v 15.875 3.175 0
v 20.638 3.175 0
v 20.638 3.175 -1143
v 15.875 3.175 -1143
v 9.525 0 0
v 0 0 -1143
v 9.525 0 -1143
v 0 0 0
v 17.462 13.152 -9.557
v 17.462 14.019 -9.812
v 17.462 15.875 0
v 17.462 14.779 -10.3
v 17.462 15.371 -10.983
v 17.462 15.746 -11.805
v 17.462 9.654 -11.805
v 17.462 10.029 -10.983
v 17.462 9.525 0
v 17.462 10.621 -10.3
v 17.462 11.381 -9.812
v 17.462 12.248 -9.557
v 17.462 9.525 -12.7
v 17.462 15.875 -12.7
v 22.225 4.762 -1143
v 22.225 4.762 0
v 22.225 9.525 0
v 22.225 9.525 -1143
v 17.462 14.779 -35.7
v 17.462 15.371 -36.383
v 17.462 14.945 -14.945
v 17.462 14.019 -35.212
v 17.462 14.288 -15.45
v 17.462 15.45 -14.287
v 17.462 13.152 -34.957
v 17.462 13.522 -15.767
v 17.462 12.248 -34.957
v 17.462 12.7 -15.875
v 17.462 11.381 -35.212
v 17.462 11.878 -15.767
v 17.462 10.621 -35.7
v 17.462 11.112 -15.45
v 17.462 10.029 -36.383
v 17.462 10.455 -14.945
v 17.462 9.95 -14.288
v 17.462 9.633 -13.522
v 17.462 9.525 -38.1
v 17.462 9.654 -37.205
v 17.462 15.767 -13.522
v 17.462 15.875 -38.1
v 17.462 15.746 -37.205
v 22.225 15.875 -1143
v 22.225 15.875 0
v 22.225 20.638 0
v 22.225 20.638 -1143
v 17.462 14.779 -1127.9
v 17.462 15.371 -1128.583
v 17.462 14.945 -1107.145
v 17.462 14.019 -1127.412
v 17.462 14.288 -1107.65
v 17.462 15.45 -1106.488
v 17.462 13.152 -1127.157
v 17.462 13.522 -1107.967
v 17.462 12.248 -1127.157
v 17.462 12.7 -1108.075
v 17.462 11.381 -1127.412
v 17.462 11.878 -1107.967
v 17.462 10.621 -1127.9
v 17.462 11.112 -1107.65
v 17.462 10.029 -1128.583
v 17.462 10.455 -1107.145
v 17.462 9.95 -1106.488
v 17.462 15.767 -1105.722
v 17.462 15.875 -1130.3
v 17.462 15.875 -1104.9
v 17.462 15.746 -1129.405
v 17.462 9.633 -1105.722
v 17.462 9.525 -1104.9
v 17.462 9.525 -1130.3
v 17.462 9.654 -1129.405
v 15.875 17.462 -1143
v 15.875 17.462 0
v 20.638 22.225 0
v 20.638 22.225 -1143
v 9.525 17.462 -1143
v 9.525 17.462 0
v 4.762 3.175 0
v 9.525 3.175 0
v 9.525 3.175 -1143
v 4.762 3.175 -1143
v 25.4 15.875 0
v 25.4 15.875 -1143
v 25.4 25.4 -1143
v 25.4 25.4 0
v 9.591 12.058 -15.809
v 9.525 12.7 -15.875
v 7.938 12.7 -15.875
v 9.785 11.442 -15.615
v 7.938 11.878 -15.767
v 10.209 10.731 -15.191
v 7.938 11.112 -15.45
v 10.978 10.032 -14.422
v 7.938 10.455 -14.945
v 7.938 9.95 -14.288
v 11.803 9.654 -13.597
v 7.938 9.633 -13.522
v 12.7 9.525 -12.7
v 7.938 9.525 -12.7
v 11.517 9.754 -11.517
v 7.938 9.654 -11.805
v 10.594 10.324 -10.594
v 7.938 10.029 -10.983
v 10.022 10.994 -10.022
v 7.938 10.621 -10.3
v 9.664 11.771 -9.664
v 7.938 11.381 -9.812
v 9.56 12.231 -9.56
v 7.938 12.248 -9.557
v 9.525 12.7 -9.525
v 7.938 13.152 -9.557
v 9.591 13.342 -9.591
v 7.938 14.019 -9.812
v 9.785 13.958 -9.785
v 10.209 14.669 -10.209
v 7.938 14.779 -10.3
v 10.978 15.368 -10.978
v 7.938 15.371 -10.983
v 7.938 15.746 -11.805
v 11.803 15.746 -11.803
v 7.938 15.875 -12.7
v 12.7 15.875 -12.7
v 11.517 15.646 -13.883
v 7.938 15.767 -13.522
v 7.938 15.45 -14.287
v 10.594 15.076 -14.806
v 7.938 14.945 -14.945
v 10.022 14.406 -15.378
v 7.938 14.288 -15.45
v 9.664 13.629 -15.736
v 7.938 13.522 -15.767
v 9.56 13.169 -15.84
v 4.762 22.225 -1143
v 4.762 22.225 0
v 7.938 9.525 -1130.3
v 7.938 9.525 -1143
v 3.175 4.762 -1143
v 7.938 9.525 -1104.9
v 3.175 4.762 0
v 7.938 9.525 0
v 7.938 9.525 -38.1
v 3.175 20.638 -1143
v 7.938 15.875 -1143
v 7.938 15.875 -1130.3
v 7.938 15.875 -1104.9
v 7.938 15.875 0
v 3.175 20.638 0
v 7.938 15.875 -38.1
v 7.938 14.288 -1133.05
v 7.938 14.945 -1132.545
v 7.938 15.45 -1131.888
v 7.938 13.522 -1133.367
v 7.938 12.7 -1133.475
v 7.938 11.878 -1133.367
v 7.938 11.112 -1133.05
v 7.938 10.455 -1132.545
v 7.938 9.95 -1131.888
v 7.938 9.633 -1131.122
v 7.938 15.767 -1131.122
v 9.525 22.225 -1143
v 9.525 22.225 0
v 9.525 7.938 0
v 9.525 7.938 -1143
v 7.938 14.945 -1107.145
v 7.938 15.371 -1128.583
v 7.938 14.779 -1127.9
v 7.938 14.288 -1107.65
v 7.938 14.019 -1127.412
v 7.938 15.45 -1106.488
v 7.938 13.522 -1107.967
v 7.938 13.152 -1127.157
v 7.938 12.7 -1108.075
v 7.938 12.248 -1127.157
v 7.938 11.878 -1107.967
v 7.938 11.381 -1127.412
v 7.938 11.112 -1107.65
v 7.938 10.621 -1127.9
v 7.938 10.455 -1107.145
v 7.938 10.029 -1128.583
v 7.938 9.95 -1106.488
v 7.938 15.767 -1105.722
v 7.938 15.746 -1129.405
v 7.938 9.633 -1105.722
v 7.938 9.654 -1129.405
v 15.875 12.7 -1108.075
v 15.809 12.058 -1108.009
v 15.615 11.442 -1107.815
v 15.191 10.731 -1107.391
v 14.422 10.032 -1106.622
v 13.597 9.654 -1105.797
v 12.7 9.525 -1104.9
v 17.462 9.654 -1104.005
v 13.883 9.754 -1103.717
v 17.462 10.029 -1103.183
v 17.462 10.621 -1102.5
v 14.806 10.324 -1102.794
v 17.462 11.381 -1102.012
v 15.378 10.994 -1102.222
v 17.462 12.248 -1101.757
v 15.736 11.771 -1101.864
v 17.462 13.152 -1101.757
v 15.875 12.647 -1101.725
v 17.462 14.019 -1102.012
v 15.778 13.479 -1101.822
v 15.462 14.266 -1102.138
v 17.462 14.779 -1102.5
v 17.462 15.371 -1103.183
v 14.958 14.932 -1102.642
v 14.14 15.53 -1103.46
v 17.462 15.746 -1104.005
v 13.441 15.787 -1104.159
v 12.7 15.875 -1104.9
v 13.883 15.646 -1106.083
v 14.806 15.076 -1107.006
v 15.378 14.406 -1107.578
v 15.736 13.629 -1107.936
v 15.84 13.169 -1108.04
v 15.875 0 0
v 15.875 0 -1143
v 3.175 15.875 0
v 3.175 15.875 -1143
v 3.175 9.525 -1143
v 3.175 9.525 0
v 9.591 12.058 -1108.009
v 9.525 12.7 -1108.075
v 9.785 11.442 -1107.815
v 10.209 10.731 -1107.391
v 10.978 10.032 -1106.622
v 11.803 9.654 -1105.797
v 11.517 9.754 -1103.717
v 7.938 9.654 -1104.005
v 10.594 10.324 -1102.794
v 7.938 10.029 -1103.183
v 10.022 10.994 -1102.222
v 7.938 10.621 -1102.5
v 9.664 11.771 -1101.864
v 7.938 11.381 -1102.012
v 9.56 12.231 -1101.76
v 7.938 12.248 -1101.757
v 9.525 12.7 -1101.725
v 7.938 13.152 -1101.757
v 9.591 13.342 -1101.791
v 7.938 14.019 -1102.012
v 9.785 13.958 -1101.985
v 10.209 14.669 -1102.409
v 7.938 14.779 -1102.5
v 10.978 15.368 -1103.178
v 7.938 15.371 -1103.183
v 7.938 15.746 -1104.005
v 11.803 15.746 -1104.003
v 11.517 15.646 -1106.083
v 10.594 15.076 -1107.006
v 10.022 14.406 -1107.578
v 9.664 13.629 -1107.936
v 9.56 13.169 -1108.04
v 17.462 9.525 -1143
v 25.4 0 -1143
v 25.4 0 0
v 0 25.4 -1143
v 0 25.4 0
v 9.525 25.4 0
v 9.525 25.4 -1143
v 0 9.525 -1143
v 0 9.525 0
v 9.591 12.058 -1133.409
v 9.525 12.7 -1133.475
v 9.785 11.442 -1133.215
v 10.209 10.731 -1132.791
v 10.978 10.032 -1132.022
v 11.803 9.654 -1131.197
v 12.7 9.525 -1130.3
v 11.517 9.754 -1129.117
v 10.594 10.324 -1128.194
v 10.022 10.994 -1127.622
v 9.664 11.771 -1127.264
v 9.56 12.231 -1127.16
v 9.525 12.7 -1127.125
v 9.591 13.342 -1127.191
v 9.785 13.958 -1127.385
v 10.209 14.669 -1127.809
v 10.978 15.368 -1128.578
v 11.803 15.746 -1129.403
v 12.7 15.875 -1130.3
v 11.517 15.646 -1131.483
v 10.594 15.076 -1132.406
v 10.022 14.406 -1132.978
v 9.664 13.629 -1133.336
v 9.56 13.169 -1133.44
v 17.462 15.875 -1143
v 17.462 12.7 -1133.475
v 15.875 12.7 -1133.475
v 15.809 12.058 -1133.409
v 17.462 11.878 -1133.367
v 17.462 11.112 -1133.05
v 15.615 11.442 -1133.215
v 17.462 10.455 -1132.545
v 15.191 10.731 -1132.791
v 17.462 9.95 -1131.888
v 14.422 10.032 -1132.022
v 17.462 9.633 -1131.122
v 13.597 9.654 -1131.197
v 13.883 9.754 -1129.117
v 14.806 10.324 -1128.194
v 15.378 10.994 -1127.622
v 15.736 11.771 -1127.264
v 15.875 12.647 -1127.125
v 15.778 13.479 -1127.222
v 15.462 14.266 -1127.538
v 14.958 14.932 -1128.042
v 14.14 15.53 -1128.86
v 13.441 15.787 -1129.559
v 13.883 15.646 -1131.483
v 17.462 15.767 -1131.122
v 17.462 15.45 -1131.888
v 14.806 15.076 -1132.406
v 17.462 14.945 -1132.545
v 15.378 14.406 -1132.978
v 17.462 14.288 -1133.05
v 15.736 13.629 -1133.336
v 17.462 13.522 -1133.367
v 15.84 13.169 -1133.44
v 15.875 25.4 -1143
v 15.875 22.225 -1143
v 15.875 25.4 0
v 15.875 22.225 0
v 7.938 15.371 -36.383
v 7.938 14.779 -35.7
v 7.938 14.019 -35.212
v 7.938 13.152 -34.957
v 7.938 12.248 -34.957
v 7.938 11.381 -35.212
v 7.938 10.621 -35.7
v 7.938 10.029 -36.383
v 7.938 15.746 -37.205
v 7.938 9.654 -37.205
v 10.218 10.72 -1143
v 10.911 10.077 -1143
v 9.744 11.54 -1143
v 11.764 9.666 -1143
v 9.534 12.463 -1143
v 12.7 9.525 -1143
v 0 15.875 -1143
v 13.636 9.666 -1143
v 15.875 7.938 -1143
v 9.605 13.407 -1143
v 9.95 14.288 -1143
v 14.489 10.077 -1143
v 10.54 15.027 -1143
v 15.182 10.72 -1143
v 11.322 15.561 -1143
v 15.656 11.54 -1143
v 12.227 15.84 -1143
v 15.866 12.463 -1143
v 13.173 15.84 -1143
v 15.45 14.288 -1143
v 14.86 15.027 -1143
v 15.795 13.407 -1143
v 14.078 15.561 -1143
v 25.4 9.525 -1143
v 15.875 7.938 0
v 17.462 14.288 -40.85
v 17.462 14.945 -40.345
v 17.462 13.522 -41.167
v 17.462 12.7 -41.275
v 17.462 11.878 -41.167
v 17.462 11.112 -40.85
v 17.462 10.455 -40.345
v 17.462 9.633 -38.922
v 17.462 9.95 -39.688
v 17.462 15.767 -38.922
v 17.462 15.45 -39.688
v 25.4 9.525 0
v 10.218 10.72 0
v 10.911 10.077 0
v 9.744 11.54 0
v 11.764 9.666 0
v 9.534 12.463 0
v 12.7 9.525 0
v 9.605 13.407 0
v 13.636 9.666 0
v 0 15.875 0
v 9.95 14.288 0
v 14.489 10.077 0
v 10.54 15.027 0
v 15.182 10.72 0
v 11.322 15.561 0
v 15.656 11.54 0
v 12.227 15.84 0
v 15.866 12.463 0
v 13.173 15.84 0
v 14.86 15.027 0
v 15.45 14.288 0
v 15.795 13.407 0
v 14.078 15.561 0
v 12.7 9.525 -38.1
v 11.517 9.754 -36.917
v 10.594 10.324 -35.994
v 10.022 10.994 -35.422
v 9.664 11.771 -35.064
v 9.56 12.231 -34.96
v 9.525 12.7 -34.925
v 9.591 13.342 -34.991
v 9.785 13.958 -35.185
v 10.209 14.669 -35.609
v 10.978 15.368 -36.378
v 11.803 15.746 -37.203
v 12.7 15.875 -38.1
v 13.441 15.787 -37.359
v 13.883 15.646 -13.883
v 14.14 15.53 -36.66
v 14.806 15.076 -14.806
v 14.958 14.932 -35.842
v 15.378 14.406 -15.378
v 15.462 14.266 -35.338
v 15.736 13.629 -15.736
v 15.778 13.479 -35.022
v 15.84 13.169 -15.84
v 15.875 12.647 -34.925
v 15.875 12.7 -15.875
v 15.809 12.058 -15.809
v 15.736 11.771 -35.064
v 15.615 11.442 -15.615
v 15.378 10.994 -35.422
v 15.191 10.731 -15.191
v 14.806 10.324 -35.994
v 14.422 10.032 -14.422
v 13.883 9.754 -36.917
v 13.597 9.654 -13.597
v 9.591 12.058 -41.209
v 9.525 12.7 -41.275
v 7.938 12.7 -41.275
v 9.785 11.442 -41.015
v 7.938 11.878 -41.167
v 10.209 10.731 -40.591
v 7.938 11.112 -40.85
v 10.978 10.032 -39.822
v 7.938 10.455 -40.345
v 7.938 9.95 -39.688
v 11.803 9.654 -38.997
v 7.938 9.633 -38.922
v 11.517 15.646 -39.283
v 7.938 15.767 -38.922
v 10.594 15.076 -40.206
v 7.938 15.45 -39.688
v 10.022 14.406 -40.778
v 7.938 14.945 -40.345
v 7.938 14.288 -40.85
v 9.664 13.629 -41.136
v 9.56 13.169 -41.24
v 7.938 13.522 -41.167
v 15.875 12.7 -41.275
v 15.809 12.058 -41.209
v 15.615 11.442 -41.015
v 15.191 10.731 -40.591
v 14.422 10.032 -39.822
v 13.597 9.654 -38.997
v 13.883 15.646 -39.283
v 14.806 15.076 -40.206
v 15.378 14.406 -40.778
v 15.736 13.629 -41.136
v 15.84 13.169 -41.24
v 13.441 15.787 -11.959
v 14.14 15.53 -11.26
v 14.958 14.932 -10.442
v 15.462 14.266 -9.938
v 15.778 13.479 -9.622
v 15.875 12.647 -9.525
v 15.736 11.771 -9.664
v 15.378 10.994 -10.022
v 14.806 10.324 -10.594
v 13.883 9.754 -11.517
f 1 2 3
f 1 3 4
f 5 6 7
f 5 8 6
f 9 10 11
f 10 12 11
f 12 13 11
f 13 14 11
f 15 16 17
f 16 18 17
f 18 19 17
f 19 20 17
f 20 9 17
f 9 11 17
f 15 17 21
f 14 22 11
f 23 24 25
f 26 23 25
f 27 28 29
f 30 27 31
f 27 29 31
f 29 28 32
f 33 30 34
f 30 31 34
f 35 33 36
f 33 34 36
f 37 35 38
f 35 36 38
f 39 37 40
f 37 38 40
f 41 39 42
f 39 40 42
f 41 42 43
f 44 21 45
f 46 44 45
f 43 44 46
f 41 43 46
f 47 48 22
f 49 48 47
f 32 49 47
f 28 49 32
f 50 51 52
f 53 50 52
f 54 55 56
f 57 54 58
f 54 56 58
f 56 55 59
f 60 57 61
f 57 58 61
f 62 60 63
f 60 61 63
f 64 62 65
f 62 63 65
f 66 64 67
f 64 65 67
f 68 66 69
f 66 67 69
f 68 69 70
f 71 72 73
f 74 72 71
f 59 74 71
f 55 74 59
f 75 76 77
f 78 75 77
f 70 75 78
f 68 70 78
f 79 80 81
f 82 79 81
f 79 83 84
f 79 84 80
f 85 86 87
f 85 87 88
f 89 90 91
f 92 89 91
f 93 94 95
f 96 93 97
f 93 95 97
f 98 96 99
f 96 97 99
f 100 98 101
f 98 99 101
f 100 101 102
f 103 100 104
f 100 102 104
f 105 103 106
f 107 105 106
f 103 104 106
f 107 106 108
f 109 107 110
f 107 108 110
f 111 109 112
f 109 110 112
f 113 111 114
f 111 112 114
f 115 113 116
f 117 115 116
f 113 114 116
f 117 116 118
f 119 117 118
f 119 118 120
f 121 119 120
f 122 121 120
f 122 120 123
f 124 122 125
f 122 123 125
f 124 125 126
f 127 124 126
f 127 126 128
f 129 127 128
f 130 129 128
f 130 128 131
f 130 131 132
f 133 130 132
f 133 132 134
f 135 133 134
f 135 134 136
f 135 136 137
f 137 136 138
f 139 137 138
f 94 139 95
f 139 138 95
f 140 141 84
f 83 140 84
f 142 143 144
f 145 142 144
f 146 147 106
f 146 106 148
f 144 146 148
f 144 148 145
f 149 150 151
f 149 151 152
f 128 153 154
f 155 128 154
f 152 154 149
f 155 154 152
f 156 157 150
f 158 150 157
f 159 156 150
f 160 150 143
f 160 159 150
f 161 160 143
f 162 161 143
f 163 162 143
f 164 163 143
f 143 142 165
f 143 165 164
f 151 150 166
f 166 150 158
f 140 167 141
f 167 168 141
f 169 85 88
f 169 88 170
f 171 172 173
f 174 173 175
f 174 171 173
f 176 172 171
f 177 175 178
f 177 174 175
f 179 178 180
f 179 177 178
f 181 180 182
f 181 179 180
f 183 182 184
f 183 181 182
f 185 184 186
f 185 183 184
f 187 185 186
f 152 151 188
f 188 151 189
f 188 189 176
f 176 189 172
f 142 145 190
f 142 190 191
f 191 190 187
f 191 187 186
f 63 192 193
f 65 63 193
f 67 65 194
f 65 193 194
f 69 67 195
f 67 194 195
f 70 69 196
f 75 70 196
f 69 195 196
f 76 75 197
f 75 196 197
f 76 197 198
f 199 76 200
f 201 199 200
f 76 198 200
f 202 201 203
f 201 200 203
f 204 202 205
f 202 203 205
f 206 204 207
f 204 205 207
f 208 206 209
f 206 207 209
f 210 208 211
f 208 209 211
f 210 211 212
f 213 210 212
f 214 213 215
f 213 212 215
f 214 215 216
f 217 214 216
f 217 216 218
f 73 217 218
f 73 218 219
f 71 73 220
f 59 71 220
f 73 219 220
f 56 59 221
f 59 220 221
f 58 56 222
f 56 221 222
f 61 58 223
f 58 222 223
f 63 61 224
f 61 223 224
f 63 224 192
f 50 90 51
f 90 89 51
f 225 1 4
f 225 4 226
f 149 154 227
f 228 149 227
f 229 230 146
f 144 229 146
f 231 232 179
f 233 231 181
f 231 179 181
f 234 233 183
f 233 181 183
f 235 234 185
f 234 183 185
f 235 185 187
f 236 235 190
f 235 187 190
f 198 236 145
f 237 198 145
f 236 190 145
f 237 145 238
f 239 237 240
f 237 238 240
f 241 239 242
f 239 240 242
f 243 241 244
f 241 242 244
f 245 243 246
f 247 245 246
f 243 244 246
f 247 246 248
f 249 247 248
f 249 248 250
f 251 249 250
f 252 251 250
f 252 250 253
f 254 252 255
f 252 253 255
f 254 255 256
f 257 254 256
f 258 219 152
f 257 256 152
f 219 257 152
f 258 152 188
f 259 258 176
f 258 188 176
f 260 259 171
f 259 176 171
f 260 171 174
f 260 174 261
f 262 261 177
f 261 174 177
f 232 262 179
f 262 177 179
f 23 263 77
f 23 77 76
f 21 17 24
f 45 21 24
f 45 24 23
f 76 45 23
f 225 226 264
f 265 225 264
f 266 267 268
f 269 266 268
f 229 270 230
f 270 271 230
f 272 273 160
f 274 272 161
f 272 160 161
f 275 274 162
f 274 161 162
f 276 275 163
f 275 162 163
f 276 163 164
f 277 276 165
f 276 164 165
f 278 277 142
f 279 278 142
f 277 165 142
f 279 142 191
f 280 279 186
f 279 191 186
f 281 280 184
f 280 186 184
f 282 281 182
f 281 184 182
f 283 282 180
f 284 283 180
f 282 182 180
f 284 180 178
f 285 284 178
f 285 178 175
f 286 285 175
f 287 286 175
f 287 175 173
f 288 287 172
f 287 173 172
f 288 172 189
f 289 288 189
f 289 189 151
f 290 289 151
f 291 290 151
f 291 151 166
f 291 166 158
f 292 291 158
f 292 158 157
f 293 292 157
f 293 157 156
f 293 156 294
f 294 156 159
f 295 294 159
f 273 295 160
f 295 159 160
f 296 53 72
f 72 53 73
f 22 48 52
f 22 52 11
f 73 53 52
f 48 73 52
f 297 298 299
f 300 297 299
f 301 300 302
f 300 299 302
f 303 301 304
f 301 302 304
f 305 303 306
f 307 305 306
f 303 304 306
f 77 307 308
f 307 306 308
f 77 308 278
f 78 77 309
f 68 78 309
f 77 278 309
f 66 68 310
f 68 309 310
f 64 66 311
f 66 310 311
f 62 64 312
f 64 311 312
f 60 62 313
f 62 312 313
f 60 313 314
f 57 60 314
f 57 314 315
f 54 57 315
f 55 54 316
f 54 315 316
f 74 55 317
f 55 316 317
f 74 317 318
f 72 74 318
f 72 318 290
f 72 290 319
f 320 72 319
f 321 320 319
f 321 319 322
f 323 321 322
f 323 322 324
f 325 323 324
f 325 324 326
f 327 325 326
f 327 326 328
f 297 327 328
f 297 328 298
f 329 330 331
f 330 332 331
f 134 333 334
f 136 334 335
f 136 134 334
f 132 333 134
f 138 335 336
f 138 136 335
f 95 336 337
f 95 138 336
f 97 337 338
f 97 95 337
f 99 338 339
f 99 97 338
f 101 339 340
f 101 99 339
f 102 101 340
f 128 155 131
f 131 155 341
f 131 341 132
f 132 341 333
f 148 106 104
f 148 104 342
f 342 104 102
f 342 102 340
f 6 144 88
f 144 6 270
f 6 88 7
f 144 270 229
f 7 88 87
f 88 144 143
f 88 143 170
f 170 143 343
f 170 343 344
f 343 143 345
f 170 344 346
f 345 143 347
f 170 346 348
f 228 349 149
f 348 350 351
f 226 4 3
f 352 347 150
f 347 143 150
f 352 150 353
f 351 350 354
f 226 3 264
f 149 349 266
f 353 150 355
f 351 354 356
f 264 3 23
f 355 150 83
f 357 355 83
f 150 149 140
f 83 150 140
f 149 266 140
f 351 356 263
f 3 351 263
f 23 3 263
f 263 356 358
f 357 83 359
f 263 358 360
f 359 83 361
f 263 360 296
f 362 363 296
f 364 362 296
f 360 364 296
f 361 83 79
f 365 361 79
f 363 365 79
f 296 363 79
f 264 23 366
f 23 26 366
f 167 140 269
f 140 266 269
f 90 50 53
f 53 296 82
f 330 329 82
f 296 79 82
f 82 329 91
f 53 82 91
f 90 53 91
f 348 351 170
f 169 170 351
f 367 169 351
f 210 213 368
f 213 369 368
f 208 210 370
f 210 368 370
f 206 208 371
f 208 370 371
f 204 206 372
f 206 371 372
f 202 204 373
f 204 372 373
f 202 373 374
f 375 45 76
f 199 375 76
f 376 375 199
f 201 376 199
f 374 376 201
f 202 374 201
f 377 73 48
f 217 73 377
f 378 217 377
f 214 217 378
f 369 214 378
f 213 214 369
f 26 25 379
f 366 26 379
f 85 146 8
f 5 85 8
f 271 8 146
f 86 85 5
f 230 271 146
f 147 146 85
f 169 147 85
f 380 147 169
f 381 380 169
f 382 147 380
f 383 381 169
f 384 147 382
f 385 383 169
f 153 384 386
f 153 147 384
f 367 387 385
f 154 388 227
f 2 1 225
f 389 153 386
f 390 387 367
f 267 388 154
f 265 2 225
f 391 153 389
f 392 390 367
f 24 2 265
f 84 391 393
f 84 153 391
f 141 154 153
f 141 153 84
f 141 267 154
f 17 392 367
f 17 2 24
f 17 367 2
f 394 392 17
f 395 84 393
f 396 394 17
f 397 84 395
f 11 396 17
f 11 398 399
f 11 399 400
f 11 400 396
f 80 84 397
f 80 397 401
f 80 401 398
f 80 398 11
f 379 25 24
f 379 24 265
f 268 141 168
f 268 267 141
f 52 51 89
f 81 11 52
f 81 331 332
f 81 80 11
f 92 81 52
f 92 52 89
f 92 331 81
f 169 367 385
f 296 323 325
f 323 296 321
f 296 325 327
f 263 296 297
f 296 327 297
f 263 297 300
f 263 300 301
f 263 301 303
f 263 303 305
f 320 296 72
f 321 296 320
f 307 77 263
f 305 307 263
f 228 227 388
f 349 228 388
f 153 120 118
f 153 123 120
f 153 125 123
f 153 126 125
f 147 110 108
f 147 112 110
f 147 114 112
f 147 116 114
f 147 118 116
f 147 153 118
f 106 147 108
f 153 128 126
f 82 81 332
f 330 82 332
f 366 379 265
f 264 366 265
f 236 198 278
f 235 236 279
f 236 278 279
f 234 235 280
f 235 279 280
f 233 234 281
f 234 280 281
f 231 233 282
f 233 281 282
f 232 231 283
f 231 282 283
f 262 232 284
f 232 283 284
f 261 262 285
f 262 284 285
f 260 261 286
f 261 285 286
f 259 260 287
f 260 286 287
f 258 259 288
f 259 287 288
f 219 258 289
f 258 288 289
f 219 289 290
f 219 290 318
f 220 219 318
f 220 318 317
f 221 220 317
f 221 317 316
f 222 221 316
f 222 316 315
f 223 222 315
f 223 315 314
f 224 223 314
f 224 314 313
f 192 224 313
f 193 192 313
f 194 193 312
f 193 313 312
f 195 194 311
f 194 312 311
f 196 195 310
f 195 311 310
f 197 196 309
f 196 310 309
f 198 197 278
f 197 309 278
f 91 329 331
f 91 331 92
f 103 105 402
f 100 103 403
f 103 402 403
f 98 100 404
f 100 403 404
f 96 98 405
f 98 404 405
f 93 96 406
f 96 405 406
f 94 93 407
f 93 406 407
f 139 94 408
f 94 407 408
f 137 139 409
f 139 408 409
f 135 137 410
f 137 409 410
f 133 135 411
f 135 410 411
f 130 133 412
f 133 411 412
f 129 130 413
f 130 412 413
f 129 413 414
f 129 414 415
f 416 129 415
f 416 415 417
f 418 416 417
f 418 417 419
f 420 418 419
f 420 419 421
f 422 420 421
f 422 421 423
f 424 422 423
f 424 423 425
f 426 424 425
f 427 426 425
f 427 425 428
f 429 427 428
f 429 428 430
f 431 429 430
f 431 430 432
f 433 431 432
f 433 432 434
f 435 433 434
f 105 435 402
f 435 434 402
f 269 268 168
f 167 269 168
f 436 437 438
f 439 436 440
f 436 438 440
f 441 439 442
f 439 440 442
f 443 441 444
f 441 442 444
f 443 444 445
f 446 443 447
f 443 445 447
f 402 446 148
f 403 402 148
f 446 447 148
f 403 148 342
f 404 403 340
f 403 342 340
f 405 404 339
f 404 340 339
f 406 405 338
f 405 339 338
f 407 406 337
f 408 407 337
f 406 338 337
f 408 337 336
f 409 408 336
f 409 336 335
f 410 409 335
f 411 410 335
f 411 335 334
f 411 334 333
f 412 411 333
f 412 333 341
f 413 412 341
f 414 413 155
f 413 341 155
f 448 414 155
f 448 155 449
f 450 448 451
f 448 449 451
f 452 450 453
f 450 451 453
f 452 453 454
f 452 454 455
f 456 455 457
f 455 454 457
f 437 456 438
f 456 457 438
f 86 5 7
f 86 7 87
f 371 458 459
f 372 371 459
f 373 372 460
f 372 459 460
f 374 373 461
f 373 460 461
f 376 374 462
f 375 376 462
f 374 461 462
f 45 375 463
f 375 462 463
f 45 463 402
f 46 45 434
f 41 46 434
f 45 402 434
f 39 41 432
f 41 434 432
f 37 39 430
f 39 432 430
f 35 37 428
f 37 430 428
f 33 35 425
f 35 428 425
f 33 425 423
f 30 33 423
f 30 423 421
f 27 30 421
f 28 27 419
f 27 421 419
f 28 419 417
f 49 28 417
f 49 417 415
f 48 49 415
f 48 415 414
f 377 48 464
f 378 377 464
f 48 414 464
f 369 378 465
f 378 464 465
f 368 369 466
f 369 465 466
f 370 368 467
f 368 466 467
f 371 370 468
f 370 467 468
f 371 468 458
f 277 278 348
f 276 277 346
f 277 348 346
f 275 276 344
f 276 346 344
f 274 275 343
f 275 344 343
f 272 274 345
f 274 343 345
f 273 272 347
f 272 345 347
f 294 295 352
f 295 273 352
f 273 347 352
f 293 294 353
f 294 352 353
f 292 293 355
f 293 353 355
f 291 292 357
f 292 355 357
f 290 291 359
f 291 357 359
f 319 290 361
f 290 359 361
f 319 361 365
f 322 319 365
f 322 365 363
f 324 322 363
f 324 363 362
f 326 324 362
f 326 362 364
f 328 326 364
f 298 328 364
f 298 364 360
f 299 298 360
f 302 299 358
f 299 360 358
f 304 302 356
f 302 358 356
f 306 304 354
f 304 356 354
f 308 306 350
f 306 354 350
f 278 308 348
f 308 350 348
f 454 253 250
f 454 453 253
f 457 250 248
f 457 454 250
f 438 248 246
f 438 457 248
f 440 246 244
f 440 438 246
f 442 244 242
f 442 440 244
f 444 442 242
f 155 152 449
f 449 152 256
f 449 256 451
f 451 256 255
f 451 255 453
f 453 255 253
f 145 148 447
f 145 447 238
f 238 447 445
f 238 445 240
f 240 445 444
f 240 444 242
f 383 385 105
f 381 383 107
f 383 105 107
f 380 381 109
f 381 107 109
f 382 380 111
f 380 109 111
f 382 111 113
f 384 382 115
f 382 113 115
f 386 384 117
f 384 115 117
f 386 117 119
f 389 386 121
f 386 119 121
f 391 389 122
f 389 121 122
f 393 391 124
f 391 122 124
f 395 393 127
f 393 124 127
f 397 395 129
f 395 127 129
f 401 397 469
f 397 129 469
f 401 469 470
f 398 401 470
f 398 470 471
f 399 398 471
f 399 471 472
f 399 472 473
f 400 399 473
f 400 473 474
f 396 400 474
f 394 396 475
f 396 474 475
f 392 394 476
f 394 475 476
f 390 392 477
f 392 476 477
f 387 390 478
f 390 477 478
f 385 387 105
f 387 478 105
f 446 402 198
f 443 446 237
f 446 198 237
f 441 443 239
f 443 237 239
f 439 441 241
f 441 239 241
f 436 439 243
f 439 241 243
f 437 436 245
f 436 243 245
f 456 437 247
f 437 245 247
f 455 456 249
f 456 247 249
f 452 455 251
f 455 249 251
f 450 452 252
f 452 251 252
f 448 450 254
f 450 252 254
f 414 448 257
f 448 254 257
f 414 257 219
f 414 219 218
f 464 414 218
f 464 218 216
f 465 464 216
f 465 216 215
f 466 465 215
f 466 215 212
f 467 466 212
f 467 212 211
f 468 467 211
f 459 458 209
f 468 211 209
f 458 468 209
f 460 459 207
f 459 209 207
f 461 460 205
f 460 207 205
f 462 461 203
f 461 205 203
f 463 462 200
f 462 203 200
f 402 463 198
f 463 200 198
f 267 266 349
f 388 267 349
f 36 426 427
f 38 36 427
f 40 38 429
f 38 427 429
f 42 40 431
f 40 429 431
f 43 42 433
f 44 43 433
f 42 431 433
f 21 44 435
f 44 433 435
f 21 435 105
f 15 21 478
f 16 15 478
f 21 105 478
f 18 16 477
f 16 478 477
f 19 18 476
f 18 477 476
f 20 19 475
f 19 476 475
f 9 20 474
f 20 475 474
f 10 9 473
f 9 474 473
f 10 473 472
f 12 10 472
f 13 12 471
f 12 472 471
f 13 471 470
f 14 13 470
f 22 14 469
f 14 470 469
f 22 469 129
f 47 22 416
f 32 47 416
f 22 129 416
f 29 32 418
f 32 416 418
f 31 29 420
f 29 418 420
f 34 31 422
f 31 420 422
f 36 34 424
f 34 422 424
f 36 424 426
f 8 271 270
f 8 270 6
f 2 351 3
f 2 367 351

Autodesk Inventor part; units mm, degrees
ref_plane "YZ Plane" through (0, 0, 0) normal (1, 0, 0) x (0, 1, 0)
ref_plane "XZ Plane" through (0, 0, 0) normal (0, 1, 0) x (-1, 0, 0)
ref_plane "XY Plane" through (0, 0, 0) normal (0, 0, 1) x (1, 0, 0)
sketch "Sketch1" plane through (0, 0, 0) normal (0, 0, 1) x (1, 0, 0)
  line L0 (0, 9.525) -> (3.175, 9.525)
  line L1 (3.175, 9.525) -> (3.175, 4.7625)
  line L2 (3.175, 20.6375) -> (3.175, 15.875)
  line L3 (3.175, 15.875) -> (0, 15.875)
  line L4 (7.9375, 15.875) -> (7.9375, 9.525)
  line L5 (25.4, 15.875) -> (22.225, 15.875)
  line L6 (22.225, 15.875) -> (22.225, 20.6375)
  line L7 (22.225, 20.6375) -> (17.4625, 15.875)
  line L8 (17.4625, 15.875) -> (17.4625, 9.525)
  line L9 (17.4625, 9.525) -> (22.225, 4.7625)
  line L10 (22.225, 4.7625) -> (22.225, 9.525)
  line L11 (22.225, 9.525) -> (25.4, 9.525)
  line L12 (25.4, 15.875) -> (25.4, 25.4)
  line L13 (25.4, 9.525) -> (25.4, 0)
  line L14 (12.7, 12.7) -> (25.4, 25.4)
  line L15 (12.7, 12.7) -> (0, 25.4)
  line L16 (12.7, 12.7) -> (0, 0)
  line L17 (12.7, 12.7) -> (25.4, 0)
  line L18 (0, 25.4) -> (9.525, 25.4)
  line L19 (9.525, 25.4) -> (9.525, 22.225)
  line L20 (9.525, 22.225) -> (4.7625, 22.225)
  line L21 (4.7625, 22.225) -> (9.525, 17.4625)
  line L22 (9.525, 17.4625) -> (15.875, 17.4625)
  line L23 (15.875, 17.4625) -> (20.6375, 22.225)
  line L24 (20.6375, 22.225) -> (15.875, 22.225)
  line L25 (15.875, 22.225) -> (15.875, 25.4)
  line L26 (15.875, 25.4) -> (25.4, 25.4)
  line L27 (0, 0) -> (9.525, 0)
  line L28 (9.525, 0) -> (9.525, 3.175)
  line L29 (9.525, 3.175) -> (4.7625, 3.175)
  line L30 (4.7625, 3.175) -> (9.525, 7.9375)
  line L31 (9.525, 7.9375) -> (15.875, 7.9375)
  line L32 (15.875, 7.9375) -> (20.6375, 3.175)
  line L33 (20.6375, 3.175) -> (15.875, 3.175)
  line L34 (15.875, 3.175) -> (15.875, 0)
  line L35 (15.875, 0) -> (25.4, 0)
  line L36 (0, 25.4) -> (0, 15.875)
  line L37 (0, 9.525) -> (0, 0)
  line L38 (7.9375, 9.525) -> (3.175, 4.7625)
  line L39 (7.9375, 15.875) -> (3.175, 20.6375)
  dimension "d1" = 25.4
  dimension "d5" = 3.175
  dimension "d6" = 4.7625
  dimension "d7" = 4.7625
  dimension "d9" = 6.35
  dimension "d10" = 3.175
  dimension "d11" = 4.7625
  dimension "d12" = 4.7625
  dimension "d13" = 3.175
  dimension "d15" = 9.525
  dimension "d16" = 3.175
  dimension "d17" = 4.7625
  dimension "d18" = 6.35
  dimension "d19" = 4.7625
  dimension "d20" = 9.525
  dimension "d21" = 3.175
  dimension "d22" = 4.7625
  dimension "d23" = 6.35
  dimension "d24" = 4.7625
extrude "Extrusion1" add sketch "Sketch1" against normal blind 1143
sketch "Sketch2" plane through (25.4, 9.525, 0) normal (1, 0, 0) x (0, 0, -1)
  line L0 (1143, -9.525) -> (1143, 0) projected
  line L1 (0, -9.525) -> (0, 0) projected
  line L2 (0, -9.525) -> (1143, -9.525) projected
  line L3 (1143, 0) -> (1143, 6.35) projected
  point P0 (12.7, 3.175)
  point P1 (38.1, 3.175)
  point P2 (1104.9, 3.175)
  point P3 (1130.3, 3.175)
  dimension "d27" = 12.7
  dimension "d28" = 25.4
  dimension "d29" = 12.7
  dimension "d30" = 25.4
  dimension "d32" = 12.7
  dimension "d33" = 12.7
hole "Hole1" at (25.4, 12.7, -12.7) at (25.4, 12.7, -38.1) at (25.4, 12.7, -1104.9) at (25.4, 12.7, -1130.3) direction (-1, 0, 0) diameter 6.35 depth 25.4 tip angle 118
hole "Hole2" at (12.7, 12.7, 0) direction (0, 0, -1) diameter 6.35 end through all
properties part number "8020_40"
